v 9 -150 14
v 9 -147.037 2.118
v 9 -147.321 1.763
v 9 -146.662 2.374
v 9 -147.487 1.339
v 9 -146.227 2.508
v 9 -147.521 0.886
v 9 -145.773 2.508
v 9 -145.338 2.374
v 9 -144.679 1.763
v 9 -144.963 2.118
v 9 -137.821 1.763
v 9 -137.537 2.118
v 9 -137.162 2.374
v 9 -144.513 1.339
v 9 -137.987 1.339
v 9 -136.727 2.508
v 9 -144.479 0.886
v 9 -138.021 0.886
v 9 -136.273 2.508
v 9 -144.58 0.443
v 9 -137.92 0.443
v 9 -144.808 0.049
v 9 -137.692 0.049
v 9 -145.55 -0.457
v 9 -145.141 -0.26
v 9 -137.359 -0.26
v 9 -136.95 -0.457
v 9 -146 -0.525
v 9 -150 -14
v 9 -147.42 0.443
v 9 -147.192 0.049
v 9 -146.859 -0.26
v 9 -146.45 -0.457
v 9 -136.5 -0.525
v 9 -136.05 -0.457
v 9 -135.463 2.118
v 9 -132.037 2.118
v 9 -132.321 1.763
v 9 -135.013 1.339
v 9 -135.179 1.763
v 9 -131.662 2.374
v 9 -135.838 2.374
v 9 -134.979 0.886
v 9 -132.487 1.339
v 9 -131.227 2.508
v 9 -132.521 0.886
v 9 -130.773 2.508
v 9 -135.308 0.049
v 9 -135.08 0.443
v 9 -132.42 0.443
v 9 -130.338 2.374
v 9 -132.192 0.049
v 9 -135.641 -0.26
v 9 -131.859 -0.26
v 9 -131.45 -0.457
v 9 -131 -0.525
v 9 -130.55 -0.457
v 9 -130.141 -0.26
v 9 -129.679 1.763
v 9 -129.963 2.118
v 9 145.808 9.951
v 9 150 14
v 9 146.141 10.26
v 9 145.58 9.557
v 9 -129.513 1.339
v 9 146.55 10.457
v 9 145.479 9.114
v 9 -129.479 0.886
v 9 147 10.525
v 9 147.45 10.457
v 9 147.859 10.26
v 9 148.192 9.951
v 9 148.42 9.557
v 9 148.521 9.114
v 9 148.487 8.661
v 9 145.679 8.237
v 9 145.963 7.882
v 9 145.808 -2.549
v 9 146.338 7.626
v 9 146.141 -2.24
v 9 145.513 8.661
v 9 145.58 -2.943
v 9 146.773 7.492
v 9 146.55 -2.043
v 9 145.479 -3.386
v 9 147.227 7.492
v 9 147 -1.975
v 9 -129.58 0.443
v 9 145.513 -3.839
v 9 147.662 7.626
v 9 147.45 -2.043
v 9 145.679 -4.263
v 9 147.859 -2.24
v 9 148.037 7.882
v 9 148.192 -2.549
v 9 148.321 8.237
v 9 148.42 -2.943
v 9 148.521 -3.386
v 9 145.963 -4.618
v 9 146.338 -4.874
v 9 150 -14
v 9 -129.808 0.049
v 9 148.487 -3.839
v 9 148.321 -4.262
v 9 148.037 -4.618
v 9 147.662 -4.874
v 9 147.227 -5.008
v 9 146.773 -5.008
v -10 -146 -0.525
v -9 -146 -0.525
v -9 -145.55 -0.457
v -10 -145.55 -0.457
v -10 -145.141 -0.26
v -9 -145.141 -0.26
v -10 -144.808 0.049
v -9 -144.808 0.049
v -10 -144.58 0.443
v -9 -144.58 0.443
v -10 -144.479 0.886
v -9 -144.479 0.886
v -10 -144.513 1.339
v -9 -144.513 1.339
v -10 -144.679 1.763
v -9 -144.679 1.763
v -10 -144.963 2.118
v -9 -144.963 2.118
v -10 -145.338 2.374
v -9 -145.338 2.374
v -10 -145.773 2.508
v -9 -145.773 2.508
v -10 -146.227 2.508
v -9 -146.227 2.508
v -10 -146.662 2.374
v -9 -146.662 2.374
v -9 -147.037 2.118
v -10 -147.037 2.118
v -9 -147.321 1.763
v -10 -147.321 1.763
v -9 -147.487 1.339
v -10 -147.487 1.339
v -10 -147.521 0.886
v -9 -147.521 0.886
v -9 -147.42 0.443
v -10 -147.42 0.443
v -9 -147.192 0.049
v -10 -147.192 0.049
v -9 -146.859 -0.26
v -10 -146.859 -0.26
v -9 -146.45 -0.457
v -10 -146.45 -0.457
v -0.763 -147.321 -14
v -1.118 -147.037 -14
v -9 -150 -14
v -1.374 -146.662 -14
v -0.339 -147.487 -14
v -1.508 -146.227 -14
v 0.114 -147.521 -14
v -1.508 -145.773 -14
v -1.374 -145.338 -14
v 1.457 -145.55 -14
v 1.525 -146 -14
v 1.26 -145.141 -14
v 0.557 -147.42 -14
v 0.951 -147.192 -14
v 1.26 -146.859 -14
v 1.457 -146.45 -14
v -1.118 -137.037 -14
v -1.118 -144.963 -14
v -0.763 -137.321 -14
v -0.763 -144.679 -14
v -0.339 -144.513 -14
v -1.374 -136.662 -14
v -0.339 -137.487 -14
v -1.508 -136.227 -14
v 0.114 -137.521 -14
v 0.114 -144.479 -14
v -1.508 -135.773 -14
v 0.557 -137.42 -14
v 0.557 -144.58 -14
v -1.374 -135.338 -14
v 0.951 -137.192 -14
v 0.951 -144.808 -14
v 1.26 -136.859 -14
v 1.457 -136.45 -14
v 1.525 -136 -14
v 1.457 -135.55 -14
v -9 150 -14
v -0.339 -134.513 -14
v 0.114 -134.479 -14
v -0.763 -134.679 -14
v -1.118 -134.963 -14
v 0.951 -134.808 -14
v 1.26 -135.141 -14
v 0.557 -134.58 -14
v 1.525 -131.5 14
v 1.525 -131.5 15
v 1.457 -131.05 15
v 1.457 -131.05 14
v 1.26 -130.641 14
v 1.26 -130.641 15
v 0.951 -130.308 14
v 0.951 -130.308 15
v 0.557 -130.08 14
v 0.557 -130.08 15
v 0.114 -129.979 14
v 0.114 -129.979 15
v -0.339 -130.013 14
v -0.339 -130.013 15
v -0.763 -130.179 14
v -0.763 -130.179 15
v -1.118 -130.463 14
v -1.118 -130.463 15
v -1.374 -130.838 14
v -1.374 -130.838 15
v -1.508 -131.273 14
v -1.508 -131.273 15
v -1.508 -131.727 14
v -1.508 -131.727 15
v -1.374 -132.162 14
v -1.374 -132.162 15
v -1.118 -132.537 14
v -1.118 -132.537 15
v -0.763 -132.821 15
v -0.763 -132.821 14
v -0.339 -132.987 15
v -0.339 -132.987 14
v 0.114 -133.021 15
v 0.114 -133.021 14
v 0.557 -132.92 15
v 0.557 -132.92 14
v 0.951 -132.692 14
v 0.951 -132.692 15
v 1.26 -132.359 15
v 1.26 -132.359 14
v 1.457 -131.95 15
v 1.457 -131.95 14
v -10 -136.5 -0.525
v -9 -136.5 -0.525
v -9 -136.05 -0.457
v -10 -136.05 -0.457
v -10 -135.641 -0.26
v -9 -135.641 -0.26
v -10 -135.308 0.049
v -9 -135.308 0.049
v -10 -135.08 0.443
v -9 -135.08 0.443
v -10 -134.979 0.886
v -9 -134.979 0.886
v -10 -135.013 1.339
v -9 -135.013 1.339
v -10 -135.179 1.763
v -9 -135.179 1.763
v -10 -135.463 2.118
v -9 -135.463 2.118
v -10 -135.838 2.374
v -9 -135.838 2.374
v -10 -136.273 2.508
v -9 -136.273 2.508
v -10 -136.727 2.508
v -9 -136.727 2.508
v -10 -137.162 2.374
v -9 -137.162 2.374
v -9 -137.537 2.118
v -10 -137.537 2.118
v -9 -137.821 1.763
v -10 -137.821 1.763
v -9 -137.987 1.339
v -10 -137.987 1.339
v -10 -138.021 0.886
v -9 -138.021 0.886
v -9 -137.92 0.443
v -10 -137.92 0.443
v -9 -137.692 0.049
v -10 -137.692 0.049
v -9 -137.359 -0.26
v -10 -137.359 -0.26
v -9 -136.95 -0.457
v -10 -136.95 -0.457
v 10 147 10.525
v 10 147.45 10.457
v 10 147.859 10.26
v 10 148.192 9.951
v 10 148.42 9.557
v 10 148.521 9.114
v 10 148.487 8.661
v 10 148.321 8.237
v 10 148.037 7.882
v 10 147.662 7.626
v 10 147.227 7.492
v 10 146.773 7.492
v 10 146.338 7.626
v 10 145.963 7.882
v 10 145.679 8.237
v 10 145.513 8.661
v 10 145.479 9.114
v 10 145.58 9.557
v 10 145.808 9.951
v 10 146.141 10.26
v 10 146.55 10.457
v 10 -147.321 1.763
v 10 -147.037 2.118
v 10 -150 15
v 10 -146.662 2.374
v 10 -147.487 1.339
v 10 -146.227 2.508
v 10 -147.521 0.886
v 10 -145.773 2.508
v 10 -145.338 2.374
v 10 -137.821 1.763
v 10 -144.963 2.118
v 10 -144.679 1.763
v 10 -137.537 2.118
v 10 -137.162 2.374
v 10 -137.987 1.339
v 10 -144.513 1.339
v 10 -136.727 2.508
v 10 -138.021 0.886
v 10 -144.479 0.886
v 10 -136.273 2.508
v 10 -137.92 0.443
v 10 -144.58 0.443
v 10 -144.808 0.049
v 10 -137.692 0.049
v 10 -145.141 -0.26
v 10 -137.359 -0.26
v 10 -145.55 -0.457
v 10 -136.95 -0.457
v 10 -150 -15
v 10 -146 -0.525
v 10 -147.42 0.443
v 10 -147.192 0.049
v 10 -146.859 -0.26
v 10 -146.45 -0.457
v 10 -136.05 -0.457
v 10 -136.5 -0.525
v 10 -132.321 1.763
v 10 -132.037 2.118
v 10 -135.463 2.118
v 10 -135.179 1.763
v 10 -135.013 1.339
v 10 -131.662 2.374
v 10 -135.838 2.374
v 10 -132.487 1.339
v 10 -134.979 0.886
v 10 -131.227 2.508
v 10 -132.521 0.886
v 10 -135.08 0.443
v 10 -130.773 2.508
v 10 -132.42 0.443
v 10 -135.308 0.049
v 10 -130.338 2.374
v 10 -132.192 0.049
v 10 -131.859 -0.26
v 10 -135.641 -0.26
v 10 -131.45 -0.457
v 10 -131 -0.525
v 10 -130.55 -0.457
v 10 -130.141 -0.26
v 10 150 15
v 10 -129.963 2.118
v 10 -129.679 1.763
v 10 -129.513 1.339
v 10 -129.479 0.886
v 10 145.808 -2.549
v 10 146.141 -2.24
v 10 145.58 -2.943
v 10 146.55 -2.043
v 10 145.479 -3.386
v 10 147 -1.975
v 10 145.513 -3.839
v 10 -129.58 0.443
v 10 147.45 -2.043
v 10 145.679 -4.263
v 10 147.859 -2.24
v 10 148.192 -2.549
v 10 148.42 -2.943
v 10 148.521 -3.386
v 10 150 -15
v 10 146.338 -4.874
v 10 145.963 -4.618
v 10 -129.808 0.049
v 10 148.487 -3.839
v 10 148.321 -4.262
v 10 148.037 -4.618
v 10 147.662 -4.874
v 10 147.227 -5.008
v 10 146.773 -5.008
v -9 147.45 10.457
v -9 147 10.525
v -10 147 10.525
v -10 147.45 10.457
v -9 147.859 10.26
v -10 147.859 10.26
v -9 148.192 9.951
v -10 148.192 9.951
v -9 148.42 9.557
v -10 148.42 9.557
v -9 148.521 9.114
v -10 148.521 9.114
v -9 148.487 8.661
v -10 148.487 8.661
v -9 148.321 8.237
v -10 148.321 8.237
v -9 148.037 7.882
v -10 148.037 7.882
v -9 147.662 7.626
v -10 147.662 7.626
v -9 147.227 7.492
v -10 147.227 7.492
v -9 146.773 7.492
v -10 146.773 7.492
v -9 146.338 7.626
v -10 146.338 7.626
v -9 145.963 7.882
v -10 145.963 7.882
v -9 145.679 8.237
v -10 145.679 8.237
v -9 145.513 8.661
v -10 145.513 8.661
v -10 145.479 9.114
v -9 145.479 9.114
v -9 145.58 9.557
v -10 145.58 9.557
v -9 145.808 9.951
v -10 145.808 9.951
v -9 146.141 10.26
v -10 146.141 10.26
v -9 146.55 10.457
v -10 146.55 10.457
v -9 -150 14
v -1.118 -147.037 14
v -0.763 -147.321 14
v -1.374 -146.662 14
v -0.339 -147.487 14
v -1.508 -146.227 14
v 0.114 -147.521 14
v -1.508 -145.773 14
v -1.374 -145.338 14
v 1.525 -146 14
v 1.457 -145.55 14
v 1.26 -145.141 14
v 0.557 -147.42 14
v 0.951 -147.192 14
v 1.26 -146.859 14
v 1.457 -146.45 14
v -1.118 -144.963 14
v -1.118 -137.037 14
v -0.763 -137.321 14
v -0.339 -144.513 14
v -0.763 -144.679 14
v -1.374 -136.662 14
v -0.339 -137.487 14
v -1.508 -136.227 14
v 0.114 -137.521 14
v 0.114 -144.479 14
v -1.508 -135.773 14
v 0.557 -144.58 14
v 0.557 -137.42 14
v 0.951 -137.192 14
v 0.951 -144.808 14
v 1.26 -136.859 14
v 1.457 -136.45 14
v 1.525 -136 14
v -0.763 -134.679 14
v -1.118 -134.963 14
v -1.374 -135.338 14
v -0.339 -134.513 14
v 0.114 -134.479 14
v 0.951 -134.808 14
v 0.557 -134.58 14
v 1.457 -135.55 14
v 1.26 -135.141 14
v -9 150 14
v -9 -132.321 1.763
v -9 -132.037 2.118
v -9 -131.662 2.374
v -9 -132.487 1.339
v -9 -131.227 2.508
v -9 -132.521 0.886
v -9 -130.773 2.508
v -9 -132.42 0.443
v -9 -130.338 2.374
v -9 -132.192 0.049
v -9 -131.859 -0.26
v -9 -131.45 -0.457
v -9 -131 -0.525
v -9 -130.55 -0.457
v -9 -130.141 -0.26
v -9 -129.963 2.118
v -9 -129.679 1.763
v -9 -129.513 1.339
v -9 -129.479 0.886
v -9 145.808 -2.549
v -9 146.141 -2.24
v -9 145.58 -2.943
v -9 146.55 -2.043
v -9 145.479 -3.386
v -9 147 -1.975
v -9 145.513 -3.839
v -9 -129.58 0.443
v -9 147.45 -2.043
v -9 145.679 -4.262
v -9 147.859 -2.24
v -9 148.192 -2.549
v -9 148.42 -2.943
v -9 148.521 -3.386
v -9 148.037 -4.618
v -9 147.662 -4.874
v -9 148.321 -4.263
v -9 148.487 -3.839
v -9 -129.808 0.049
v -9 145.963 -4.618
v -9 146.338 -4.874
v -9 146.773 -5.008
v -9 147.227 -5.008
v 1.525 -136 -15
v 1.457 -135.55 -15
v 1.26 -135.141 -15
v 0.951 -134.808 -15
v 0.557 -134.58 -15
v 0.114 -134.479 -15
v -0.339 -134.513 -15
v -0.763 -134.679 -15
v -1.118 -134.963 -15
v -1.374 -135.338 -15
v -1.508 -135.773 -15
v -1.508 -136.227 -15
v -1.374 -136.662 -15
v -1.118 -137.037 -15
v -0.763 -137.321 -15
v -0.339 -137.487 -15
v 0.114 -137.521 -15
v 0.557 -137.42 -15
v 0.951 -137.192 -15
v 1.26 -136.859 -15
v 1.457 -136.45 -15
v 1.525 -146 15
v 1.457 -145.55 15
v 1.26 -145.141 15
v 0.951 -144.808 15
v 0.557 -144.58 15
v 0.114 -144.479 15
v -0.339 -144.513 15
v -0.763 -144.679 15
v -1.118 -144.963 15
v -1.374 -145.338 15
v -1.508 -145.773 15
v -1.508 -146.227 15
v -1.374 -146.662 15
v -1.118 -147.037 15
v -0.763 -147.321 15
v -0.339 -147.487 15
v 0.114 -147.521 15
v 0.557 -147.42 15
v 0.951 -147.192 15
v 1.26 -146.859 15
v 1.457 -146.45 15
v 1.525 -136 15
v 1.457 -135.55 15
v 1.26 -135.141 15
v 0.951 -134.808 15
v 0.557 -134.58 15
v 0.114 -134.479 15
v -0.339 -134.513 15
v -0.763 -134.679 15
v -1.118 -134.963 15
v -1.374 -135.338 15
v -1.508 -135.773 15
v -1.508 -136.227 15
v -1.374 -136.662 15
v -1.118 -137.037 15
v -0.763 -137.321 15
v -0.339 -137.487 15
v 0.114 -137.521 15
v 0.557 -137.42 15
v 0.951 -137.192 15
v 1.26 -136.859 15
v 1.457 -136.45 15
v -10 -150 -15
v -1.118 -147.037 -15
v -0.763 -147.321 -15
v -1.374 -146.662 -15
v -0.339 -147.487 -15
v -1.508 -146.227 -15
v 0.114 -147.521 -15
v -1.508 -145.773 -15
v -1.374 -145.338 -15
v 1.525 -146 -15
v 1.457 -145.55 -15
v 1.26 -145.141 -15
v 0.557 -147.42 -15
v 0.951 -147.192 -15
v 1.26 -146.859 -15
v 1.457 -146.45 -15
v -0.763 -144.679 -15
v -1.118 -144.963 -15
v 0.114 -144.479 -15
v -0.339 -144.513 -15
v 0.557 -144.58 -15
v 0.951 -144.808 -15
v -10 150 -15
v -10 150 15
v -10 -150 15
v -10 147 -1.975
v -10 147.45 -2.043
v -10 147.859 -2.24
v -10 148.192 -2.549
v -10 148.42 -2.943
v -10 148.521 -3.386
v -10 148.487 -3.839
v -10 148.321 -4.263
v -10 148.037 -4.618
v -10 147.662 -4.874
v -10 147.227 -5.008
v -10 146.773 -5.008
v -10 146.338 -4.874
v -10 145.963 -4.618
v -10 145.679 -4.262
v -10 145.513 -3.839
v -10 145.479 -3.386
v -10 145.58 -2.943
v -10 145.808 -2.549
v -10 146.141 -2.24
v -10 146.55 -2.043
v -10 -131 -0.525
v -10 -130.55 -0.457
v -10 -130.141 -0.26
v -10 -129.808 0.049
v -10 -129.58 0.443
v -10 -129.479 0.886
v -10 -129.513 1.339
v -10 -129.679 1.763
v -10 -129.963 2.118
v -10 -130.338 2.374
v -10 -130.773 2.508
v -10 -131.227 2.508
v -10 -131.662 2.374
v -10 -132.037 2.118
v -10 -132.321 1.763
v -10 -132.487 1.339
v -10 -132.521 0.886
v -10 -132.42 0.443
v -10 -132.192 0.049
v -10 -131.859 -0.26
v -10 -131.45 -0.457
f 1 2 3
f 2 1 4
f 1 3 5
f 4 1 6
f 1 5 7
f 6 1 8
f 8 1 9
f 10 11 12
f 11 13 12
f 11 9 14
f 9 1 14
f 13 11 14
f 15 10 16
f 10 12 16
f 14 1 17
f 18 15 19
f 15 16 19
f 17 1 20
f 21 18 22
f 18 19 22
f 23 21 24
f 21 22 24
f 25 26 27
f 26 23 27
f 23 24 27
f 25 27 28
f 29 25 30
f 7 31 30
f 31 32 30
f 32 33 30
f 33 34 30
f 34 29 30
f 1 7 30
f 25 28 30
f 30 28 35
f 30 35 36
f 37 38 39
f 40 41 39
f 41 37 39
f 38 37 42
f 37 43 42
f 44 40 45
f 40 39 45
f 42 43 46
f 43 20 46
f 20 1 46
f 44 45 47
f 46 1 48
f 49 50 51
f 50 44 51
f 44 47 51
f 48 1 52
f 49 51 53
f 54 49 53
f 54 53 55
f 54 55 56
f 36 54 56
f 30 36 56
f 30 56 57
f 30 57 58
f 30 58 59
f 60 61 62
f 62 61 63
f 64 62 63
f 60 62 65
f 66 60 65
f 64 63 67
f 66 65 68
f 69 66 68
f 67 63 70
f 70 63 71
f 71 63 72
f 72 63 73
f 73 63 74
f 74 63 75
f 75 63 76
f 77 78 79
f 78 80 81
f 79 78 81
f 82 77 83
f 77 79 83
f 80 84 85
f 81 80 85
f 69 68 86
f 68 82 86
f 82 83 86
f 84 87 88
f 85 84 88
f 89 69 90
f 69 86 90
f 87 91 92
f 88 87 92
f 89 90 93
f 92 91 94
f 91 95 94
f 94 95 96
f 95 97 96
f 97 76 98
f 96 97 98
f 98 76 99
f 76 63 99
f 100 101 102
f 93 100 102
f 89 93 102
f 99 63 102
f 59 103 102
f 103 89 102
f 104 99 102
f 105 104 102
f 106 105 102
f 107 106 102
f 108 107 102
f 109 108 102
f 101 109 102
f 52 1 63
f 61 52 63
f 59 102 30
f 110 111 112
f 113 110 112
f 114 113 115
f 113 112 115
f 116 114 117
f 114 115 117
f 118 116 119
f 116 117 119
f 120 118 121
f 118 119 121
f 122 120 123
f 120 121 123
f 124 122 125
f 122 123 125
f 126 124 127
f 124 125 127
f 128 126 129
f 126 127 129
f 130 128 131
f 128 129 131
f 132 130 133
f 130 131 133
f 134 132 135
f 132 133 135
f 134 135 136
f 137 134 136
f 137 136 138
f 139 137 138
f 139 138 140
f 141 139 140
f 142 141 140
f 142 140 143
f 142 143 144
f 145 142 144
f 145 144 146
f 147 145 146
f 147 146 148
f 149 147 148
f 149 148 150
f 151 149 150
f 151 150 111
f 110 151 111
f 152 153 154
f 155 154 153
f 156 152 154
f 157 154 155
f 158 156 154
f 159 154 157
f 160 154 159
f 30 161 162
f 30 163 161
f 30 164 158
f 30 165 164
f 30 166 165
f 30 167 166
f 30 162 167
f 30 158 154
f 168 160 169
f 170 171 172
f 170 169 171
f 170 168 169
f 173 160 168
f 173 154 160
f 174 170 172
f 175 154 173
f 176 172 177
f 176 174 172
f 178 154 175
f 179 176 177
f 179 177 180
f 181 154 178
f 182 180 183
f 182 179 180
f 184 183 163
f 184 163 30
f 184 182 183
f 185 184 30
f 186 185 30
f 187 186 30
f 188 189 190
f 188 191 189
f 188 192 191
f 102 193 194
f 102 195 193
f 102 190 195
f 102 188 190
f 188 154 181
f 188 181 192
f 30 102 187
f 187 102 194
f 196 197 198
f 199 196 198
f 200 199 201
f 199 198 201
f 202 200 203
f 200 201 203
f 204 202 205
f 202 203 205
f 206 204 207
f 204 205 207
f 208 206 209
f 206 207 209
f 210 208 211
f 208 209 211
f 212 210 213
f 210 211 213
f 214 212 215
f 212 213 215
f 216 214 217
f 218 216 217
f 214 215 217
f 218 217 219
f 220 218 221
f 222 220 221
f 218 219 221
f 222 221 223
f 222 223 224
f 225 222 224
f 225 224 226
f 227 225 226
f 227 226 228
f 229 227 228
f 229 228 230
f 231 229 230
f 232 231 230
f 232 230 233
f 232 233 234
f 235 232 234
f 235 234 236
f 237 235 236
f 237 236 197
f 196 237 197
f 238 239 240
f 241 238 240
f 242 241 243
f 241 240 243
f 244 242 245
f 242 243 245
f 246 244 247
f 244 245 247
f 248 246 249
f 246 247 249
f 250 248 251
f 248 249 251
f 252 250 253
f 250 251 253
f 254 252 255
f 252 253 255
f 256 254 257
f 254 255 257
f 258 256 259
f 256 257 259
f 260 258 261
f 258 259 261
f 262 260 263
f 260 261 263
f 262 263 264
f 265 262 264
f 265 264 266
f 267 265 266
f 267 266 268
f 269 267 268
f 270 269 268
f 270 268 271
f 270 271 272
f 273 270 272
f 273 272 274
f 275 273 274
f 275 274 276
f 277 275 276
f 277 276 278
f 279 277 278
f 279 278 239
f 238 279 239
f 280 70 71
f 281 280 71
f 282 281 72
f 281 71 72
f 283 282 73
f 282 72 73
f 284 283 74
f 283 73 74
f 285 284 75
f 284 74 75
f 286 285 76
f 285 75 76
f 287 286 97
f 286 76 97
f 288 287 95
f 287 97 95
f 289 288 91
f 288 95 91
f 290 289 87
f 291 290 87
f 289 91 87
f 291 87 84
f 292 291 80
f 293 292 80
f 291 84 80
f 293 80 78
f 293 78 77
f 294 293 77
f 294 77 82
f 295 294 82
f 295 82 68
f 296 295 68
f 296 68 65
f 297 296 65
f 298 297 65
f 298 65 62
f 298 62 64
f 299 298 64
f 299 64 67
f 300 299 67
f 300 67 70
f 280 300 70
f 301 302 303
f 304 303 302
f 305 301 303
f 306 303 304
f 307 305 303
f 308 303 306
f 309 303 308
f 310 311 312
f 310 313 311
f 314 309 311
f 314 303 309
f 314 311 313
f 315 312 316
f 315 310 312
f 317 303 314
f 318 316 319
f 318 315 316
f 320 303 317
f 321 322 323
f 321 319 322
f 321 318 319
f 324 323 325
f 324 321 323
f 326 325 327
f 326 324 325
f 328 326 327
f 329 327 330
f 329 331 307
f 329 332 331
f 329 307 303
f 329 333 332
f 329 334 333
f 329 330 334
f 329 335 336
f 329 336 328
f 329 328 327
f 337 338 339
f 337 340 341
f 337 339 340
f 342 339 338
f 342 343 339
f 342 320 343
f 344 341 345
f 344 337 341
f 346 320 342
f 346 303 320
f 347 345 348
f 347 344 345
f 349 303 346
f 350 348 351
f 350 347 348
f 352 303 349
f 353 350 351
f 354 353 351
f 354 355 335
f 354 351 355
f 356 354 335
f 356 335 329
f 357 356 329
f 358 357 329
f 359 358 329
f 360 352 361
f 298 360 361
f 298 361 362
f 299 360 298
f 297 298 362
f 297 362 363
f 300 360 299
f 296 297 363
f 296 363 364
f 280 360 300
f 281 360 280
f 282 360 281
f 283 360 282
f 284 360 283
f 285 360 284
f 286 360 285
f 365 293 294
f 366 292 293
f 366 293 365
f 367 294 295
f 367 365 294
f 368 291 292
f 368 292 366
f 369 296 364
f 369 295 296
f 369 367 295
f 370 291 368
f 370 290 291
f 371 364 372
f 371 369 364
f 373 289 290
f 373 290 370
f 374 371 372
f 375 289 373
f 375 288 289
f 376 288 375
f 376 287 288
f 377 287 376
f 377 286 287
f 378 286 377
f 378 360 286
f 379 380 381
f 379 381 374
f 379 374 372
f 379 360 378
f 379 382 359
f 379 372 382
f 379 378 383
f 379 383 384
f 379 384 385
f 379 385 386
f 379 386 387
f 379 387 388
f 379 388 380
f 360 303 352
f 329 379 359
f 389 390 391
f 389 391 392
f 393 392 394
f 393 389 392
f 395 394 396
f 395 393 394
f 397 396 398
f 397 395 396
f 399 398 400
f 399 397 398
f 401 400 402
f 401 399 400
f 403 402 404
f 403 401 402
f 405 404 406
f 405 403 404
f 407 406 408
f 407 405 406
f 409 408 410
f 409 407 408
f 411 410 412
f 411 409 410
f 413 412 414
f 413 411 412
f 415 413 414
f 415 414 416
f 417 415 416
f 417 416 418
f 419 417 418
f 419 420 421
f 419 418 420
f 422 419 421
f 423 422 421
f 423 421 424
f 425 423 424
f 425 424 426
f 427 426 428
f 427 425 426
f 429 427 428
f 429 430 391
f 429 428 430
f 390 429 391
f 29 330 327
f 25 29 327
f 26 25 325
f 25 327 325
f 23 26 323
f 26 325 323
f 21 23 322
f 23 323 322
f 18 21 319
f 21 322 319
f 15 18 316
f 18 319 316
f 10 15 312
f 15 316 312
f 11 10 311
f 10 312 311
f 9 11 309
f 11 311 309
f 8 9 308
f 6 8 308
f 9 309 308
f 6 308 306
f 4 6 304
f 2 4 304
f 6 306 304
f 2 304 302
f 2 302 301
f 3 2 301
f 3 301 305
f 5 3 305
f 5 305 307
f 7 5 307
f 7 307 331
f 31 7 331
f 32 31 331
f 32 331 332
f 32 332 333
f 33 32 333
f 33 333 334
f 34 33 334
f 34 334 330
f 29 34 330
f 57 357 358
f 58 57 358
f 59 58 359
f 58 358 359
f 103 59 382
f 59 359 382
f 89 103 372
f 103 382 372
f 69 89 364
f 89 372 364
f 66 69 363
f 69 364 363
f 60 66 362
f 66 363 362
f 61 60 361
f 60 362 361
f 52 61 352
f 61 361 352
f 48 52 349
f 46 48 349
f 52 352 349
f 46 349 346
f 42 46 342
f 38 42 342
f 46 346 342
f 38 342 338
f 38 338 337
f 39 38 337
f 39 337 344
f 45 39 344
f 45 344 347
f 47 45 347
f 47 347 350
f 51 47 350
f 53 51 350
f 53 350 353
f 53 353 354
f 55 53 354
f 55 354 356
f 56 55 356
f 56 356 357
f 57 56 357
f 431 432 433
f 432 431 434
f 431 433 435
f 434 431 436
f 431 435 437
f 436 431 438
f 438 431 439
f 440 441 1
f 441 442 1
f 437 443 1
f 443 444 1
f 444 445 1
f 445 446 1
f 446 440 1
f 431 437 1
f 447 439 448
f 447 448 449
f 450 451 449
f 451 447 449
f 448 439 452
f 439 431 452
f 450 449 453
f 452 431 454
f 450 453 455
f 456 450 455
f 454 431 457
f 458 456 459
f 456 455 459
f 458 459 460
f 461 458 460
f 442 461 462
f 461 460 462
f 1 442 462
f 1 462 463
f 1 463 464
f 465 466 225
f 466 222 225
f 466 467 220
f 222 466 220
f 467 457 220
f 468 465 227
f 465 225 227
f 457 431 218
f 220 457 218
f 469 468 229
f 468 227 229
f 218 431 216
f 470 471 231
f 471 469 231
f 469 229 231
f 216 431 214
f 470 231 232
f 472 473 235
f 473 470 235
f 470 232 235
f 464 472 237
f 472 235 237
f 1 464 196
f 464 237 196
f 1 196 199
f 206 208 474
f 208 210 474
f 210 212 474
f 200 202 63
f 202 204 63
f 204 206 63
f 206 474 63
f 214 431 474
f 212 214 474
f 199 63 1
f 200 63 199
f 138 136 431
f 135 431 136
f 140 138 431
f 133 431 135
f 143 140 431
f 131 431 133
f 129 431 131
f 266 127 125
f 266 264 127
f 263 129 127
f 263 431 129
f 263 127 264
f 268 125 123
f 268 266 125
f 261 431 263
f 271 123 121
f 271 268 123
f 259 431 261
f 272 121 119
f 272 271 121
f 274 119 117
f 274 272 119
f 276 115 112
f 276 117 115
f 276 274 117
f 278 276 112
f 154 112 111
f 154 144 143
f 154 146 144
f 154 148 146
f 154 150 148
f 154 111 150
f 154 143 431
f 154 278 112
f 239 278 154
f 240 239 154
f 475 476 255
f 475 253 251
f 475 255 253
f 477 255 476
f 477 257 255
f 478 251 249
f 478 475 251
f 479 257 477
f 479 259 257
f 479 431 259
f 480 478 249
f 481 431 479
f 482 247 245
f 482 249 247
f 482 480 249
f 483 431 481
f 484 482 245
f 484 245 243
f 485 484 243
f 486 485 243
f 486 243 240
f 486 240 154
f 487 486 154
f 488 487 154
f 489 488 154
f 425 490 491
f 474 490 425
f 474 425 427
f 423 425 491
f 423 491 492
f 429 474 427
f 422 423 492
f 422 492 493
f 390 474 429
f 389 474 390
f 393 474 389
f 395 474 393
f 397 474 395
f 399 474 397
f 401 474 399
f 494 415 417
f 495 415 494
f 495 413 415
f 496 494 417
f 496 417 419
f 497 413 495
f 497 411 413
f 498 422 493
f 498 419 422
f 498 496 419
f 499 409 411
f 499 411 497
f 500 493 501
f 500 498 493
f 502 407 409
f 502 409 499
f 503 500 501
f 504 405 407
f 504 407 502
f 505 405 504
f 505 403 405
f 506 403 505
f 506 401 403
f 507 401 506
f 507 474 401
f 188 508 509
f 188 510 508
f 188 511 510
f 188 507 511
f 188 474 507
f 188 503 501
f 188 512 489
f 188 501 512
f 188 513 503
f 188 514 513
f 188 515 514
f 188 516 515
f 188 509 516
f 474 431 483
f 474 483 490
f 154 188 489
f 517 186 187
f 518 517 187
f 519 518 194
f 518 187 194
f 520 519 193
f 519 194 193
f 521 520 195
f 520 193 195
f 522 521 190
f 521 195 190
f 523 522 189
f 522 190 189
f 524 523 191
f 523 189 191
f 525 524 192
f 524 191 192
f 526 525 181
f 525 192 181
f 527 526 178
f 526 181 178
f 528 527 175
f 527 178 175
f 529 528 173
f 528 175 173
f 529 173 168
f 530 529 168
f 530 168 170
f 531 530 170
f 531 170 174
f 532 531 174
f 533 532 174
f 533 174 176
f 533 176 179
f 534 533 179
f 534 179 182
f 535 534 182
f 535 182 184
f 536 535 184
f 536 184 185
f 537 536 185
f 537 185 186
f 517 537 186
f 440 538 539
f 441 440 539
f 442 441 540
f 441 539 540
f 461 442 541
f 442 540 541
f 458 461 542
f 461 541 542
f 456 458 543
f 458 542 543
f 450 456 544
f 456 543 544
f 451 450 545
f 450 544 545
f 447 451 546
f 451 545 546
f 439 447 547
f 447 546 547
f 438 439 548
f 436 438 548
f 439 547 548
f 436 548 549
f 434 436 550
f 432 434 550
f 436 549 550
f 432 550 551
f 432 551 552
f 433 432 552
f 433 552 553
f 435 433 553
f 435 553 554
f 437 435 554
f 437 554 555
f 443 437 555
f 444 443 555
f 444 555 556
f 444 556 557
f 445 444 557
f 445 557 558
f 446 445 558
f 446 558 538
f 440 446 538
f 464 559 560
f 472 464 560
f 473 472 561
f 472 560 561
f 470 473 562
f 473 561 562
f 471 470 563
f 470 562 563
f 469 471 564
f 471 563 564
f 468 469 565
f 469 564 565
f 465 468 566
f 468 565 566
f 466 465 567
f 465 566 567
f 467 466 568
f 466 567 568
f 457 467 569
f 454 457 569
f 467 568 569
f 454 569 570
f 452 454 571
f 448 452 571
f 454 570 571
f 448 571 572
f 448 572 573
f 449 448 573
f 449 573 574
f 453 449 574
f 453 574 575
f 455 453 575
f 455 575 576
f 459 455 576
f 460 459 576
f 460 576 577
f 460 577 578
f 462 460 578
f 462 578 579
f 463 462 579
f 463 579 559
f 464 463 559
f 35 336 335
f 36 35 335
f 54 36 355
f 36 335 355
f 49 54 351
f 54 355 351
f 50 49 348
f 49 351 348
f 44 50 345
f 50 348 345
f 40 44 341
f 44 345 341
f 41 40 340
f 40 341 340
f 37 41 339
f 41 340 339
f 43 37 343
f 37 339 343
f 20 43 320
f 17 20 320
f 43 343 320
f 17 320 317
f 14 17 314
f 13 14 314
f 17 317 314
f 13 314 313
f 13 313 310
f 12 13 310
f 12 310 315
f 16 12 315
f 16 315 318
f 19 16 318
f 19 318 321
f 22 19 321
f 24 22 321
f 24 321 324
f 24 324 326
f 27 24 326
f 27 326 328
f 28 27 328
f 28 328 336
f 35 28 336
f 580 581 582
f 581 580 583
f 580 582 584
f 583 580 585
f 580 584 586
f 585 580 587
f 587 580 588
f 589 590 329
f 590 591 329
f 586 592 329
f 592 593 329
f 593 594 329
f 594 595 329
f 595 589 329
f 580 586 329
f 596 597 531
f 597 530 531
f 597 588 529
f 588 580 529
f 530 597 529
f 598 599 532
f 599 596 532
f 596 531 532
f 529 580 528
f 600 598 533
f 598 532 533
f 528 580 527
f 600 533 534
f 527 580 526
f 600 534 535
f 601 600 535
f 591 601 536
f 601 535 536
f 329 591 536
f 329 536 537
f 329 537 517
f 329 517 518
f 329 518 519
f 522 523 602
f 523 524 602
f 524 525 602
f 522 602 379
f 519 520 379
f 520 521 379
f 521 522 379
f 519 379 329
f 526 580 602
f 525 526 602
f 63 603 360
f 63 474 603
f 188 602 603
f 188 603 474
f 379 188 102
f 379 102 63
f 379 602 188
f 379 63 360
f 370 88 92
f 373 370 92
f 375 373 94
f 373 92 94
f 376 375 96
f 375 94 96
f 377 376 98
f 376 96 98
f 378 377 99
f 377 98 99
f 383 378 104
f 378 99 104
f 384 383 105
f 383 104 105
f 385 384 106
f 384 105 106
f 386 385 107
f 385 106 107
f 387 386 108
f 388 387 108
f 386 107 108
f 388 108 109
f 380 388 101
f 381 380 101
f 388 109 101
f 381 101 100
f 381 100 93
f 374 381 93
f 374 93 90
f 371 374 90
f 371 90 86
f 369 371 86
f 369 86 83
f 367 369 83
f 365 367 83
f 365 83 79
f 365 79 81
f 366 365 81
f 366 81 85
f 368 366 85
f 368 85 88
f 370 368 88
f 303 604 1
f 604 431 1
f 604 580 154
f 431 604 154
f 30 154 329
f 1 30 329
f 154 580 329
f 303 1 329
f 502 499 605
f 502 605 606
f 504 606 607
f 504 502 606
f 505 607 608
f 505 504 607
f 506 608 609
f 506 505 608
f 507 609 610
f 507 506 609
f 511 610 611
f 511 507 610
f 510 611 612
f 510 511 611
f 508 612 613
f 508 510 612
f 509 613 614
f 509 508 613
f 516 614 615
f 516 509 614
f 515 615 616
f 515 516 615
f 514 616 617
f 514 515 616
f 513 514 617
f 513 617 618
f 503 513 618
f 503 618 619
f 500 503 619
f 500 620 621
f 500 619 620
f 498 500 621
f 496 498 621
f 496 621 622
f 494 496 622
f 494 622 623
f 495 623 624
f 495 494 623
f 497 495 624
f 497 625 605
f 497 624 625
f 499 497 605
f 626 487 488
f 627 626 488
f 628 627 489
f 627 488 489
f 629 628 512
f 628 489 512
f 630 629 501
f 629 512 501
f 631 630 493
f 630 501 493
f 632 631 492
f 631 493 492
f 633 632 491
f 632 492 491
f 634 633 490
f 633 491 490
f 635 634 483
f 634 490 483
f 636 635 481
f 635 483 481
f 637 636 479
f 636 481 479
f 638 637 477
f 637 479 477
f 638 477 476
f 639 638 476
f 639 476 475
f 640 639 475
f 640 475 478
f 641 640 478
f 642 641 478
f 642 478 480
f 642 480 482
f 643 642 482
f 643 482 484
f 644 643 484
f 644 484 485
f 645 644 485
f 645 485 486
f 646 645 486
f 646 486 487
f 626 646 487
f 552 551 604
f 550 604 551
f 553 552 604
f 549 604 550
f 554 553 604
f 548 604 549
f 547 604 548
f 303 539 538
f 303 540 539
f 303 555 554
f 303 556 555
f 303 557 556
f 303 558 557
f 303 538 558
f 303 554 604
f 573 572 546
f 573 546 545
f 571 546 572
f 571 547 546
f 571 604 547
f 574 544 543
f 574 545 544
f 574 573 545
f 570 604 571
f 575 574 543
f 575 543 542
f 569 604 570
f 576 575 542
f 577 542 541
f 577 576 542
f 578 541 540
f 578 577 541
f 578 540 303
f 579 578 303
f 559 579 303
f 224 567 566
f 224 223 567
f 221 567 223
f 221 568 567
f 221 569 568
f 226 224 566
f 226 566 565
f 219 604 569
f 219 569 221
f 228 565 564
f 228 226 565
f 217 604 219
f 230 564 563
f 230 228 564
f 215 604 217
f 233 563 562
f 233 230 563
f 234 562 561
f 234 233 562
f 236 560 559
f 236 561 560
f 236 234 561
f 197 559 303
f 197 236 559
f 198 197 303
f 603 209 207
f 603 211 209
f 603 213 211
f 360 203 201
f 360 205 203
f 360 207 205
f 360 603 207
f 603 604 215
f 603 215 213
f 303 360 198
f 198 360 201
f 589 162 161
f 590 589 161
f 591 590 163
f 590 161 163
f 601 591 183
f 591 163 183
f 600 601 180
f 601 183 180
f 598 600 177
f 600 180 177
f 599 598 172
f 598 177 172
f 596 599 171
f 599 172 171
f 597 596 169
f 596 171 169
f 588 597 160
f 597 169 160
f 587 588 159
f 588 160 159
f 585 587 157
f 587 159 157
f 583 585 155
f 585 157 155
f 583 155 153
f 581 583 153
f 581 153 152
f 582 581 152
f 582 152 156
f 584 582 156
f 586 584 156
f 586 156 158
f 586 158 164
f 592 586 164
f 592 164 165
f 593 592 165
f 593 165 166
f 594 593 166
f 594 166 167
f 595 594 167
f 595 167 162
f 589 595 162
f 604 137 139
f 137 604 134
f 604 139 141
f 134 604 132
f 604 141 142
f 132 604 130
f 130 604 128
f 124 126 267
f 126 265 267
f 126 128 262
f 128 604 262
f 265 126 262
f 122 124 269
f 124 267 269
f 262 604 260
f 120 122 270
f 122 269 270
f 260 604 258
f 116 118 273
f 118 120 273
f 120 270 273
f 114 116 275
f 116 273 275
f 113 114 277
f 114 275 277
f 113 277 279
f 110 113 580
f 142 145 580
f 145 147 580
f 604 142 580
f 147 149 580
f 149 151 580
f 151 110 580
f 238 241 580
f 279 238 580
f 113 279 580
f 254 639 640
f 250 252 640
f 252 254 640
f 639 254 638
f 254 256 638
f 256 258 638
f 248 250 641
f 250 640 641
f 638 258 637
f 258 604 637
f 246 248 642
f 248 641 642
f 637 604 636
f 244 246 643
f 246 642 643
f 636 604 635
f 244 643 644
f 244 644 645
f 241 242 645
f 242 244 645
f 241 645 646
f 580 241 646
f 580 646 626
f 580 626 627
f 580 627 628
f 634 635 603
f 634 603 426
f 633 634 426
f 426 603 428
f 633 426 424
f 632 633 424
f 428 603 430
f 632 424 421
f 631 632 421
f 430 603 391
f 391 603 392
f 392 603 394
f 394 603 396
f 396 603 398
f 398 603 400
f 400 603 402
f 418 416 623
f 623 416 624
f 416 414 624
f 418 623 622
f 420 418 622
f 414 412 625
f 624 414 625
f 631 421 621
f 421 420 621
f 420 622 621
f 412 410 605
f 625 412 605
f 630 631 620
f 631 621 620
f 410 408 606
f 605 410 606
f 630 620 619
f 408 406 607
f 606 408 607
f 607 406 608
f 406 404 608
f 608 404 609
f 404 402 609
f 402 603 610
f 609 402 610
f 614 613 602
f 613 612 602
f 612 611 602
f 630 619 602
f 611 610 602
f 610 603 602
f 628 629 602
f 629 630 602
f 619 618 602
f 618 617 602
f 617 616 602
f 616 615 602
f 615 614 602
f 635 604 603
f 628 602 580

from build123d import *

# Parameters (mm, degrees)
SKETCH_1_W                = 20
SKETCH_1_H                = 30
EXTRUDE_1_DEPTH           = 150
SKETCH_2_W                = 18
SKETCH_2_H                = 28
CUT_EXTRUDE_1_DEPTH       = 301
SKETCH_3_R                = 1.525
CUT_EXTRUDE_2_DEPTH       = 21
SKETCH_4_R                = 1.525
CUT_EXTRUDE_3_DEPTH       = 31
SKETCH_5_R                = 1.525
CUT_EXTRUDE_4_DEPTH       = 31
SKETCH_6_OUTSIDE_W        = 92.432
SKETCH_6_OUTSIDE_H        = 362.432
SKETCH_6_OUTSIDE_W_2      = 30
SKETCH_6_OUTSIDE_H_2      = 300
SKETCH_6_OUTSIDE_R        = 1.525
CUT_EXTRUDE_6_DEPTH       = 21
CUT_EXTRUDE_8_REACH       = 32
SKETCH_9_R                = 1.525
SKETCH_10_R               = 1.525
CUT_EXTRUDE_9_DEPTH       = 1
CUT_EXTRUDE_9_DEPTH_BACK  = 21
SKETCH_11_R               = 1.525
CUT_EXTRUDE_10_DEPTH      = 20
CUT_EXTRUDE_10_DEPTH_BACK = 2


with BuildPart() as part:
    # 草图1 → 凸台-拉伸1 (new body, symmetric)
    with BuildSketch(Plane(origin=(0, 0, 0), x_dir=(1, 0, 0), z_dir=(0, 1, 0))):
        Rectangle(SKETCH_1_W, SKETCH_1_H)
    extrude(amount=EXTRUDE_1_DEPTH, both=True)

    # 草图2 → 切除-拉伸1 (cut, through all)
    with BuildSketch(Plane(origin=(0, 150, 0), x_dir=(1, 0, 0), z_dir=(0, 1, 0))):
        Rectangle(SKETCH_2_W, SKETCH_2_H)
    extrude(amount=-CUT_EXTRUDE_1_DEPTH, mode=Mode.SUBTRACT)

    # 草图3 → 切除-拉伸2 (cut, through all)
    with BuildSketch(Plane(origin=(10, 0, 0), x_dir=(0, 0, -1), z_dir=(1, 0, 0))):
        with Locations((-1, -146)):
            Circle(SKETCH_3_R)
    extrude(amount=-CUT_EXTRUDE_2_DEPTH, mode=Mode.SUBTRACT)

    # 草图4 → 切除-拉伸3 (cut, through all)
    with BuildSketch(Plane.XY.offset(15)):
        with Locations((0, -146)):
            Circle(SKETCH_4_R)
    extrude(amount=-CUT_EXTRUDE_3_DEPTH, mode=Mode.SUBTRACT)

    # 草图5 → 切除-拉伸4 (cut, through all)
    with BuildSketch(Plane.XY.offset(15)):
        with Locations((0, -136)):
            Circle(SKETCH_5_R)
    extrude(amount=-CUT_EXTRUDE_4_DEPTH, mode=Mode.SUBTRACT)

    # 草图6 outside → 切除-拉伸6 (cut, through all)
    with BuildSketch(Plane(origin=(10, 0, 0), x_dir=(0, 0, -1), z_dir=(1, 0, 0))):
        Rectangle(SKETCH_6_OUTSIDE_W, SKETCH_6_OUTSIDE_H)
        Rectangle(SKETCH_6_OUTSIDE_W_2, SKETCH_6_OUTSIDE_H_2, mode=Mode.SUBTRACT)
        with Locations((-1, -131)):
            Circle(SKETCH_6_OUTSIDE_R)
    extrude(amount=-CUT_EXTRUDE_6_DEPTH, mode=Mode.SUBTRACT)

    # 草图9 → 切除-拉伸8 (cut, up to next)
    with BuildSketch(Plane.XY.offset(15), mode=Mode.PRIVATE) as cut_extrude_8_sk1:
        with Locations((0, -131.5)):
            Circle(SKETCH_9_R)
    cut_extrude_8_tool1 = extrude(cut_extrude_8_sk1.sketch, amount=-CUT_EXTRUDE_8_REACH, mode=Mode.PRIVATE) & part.part
    add(cut_extrude_8_tool1.solids().sort_by_distance((0, -131.5, 15))[0], mode=Mode.SUBTRACT)

    # 草图10 → 切除-拉伸9 (cut, two sides)
    with BuildSketch(Plane(origin=(10, 0, 0), x_dir=(0, 0, -1), z_dir=(1, 0, 0))) as cut_extrude_9_sk:
        with Locations((-1, -136.5)):
            Circle(SKETCH_10_R)
    extrude(amount=CUT_EXTRUDE_9_DEPTH, mode=Mode.SUBTRACT)
    extrude(cut_extrude_9_sk.sketch, amount=-CUT_EXTRUDE_9_DEPTH_BACK, mode=Mode.SUBTRACT)

    # 草图11 → 切除-拉伸10 (cut, two sides)
    with BuildSketch(Plane.ZY.offset(-9)) as cut_extrude_10_sk:
        with Locations((9, 147)):
            Circle(SKETCH_11_R)
        with Locations((-3.5, 147)):
            Circle(SKETCH_11_R)
    extrude(amount=CUT_EXTRUDE_10_DEPTH, mode=Mode.SUBTRACT)
    extrude(cut_extrude_10_sk.sketch, amount=-CUT_EXTRUDE_10_DEPTH_BACK, mode=Mode.SUBTRACT)


solid = part.part
